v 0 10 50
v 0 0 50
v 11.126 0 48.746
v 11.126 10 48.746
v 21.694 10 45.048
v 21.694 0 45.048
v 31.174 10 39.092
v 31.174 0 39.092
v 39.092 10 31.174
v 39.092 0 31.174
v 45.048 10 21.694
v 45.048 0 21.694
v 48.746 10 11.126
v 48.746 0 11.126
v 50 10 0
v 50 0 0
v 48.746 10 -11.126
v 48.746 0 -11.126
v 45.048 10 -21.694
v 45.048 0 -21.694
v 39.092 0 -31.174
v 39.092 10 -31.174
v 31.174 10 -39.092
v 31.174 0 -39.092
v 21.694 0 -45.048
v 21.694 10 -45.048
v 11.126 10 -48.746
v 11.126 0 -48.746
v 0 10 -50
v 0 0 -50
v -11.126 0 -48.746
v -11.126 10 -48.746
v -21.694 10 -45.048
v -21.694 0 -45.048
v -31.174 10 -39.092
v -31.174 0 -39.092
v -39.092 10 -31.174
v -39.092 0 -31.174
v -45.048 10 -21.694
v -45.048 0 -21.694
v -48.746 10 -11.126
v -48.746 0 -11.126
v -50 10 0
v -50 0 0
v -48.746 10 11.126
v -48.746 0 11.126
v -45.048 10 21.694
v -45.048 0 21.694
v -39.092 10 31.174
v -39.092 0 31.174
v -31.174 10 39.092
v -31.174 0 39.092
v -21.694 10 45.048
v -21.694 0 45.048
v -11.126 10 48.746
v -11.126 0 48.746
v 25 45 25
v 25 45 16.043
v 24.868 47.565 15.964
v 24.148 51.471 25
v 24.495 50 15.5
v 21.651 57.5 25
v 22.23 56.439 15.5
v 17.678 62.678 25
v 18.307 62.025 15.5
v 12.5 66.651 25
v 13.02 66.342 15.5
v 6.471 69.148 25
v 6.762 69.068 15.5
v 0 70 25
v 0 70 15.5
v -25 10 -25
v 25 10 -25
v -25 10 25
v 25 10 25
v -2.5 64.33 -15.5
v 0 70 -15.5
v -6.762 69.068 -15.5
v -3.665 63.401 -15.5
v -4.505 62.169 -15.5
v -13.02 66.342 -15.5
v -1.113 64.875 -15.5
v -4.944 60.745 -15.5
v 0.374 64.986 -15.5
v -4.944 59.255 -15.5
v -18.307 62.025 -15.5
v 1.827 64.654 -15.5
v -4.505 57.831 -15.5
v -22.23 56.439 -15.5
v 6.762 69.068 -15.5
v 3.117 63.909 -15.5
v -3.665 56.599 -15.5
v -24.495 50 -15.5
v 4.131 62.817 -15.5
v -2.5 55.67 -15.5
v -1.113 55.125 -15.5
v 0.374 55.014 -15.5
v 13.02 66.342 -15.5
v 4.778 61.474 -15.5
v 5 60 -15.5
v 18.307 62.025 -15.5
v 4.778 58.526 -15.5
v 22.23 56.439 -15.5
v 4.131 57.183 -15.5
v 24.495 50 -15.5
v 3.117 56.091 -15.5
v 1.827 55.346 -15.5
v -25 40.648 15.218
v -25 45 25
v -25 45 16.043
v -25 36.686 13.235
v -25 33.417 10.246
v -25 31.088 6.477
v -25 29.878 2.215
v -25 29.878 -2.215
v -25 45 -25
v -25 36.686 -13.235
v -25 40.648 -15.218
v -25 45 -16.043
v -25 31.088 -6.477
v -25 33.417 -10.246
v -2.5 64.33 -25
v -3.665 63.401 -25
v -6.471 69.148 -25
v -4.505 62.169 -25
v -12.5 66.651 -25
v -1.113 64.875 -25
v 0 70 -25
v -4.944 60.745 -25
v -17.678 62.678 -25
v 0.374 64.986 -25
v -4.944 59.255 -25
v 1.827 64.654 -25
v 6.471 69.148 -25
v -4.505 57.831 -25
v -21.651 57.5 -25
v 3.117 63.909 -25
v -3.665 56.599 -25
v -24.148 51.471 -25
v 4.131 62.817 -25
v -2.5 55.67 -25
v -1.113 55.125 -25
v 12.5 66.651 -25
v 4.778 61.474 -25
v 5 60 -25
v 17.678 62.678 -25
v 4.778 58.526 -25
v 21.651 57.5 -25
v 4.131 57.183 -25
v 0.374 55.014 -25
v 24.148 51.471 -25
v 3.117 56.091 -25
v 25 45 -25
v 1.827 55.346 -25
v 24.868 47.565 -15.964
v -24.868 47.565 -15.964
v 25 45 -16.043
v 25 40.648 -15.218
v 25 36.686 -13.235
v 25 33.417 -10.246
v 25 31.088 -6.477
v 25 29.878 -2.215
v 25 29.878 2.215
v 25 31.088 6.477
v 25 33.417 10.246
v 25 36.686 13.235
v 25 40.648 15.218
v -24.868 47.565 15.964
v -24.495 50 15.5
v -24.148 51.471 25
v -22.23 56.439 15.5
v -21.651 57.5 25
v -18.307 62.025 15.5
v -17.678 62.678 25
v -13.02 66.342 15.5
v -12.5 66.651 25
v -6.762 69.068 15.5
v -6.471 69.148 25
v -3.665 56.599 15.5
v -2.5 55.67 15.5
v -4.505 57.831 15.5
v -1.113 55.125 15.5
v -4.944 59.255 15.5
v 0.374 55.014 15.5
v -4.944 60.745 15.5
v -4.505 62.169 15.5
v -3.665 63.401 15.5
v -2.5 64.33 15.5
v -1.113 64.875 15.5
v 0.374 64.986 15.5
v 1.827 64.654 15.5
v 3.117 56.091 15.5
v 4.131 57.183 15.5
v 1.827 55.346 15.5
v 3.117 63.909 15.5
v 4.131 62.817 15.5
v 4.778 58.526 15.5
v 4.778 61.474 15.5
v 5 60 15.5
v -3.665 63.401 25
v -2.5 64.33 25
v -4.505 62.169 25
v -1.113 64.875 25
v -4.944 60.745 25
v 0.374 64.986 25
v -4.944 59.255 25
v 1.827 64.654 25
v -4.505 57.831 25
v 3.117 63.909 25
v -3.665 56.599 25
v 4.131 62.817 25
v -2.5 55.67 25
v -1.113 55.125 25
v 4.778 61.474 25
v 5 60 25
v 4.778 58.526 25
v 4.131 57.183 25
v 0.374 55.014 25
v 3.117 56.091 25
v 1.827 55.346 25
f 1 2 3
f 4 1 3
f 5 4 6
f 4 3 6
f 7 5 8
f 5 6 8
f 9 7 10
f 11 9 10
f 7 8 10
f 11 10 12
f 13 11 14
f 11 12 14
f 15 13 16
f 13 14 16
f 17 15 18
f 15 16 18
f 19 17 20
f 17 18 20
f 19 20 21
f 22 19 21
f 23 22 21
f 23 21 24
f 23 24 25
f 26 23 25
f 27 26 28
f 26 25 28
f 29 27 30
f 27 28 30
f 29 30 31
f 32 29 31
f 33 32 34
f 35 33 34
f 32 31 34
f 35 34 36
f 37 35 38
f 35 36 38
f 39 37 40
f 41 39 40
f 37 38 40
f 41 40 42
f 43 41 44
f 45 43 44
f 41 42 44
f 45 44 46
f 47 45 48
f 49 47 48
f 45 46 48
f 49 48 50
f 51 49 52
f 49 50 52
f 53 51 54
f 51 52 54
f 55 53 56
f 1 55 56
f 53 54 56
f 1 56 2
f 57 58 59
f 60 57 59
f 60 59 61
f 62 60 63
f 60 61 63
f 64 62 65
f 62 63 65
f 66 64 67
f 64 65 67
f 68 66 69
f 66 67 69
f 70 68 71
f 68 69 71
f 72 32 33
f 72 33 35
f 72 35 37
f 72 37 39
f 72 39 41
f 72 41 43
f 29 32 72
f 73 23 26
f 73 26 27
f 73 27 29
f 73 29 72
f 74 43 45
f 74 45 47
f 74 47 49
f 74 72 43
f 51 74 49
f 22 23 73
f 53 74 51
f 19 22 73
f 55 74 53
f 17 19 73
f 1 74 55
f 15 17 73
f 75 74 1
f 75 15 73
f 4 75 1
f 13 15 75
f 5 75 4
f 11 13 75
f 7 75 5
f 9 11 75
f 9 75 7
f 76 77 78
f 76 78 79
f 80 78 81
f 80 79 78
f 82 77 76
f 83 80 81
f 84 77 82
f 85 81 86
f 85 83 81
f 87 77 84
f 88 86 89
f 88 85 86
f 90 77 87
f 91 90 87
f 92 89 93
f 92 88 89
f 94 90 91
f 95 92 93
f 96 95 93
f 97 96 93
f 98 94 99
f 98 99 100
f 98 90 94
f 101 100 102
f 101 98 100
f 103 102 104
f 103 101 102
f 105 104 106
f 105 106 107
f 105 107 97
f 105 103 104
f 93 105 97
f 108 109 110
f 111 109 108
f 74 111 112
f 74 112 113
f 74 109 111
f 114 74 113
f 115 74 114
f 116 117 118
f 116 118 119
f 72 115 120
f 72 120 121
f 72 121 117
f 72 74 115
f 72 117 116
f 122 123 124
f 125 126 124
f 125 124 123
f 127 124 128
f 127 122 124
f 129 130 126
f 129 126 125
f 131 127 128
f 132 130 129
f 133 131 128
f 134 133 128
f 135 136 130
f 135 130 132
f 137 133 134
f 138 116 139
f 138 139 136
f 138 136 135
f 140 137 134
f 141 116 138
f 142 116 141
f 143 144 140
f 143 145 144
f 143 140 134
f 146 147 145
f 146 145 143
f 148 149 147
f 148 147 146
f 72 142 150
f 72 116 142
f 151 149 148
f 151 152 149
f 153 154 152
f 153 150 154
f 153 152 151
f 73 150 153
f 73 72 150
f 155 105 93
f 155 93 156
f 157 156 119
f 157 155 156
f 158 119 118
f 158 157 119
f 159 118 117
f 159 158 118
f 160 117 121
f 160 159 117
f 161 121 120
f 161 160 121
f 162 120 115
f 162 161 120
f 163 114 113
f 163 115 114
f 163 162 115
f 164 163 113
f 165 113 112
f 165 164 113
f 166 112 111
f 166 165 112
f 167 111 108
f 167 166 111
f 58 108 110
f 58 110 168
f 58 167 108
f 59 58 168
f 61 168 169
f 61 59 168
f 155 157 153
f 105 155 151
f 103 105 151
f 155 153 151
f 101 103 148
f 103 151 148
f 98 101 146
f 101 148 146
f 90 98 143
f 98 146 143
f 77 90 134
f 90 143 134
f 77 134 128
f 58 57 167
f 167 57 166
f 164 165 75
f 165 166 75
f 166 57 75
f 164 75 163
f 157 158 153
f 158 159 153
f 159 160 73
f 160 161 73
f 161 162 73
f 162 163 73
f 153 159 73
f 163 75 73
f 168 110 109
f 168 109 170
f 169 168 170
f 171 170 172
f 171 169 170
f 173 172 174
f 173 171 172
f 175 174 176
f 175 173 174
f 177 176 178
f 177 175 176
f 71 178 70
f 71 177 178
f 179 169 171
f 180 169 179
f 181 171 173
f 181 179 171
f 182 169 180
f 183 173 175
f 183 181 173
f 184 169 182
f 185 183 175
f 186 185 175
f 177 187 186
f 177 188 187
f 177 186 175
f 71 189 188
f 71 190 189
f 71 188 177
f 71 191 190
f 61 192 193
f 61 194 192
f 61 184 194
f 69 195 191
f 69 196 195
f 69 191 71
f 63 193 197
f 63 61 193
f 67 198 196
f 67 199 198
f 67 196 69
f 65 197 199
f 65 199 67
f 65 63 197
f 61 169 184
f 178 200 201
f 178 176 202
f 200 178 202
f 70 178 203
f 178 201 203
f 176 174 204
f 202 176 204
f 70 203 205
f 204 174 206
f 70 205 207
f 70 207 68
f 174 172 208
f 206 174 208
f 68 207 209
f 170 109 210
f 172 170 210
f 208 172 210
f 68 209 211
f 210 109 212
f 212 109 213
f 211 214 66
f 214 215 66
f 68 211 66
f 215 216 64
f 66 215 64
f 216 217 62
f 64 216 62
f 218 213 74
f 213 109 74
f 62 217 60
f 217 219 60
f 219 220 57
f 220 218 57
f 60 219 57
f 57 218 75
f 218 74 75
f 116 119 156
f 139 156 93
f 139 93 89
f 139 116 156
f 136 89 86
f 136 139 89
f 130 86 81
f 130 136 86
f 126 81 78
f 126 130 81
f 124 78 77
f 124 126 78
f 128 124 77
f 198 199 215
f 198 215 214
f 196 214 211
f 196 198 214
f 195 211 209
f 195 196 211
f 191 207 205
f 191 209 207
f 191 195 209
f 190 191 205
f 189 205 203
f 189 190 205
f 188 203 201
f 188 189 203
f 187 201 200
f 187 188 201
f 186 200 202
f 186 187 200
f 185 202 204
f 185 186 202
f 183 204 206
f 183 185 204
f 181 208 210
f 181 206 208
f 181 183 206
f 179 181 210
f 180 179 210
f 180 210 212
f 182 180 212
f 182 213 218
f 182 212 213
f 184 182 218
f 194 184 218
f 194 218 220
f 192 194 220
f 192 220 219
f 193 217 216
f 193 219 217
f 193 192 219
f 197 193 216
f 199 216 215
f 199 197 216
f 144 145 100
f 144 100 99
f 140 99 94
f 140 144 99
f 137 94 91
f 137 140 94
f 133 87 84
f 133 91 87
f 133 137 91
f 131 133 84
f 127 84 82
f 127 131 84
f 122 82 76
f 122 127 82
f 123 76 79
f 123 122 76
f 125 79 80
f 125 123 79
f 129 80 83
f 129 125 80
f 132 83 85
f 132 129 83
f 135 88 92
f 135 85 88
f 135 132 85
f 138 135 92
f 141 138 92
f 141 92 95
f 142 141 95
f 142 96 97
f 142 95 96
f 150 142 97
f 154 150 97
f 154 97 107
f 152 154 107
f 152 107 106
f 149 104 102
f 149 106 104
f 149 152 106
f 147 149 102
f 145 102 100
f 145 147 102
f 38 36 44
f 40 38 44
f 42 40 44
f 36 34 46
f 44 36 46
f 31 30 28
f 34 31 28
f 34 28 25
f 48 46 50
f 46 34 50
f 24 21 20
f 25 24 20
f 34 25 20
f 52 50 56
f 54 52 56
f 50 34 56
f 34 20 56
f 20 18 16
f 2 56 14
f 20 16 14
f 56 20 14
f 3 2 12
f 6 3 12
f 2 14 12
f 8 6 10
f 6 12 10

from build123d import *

# Parameters (mm, degrees)
SKETCH2_R               = 50
BOSS_EXTRUDE1_DEPTH     = 10
SKETCH3_W               = 50
SKETCH3_H               = 50
BOSS_EXTRUDE2_DEPTH     = 60
CUT_EXTRUDE1_DEPTH      = 115.127122105
CUT_EXTRUDE2_DEPTH      = 109.12145948
CUT_EXTRUDE2_DEPTH_BACK = 109.12145948
SKETCH5_R               = 5
FILLET1_R               = 25


with BuildPart() as part:
    # Sketch2 → Boss-Extrude1 (new body)
    with BuildSketch(Plane(origin=(0, 0, 0), x_dir=(1, 0, 0), z_dir=(0, 1, 0))):
        with Locations(Location((0, 0, 0), (0, 0, 270))):
            Circle(SKETCH2_R)
    extrude(amount=BOSS_EXTRUDE1_DEPTH)

    # Sketch3 → Boss-Extrude2 (add)
    with BuildSketch(Plane(origin=(0, 10, 0), x_dir=(1, 0, 0), z_dir=(0, 1, 0))):
        Rectangle(SKETCH3_W, SKETCH3_H)
    extrude(amount=BOSS_EXTRUDE2_DEPTH)

    # Sketch4 → Cut-Extrude1 (cut, through all)
    with BuildSketch(Plane(origin=(25, 0, 0), x_dir=(0, 0, -1), z_dir=(1, 0, 0))):
        with BuildLine():
            Line((-15.5, 70), (15.5, 70))
            Line((15.5, 70), (15.5, 50))
            ThreePointArc((15.5, 50), (0, 29.724643504), (-15.5, 50))
            Line((-15.5, 50), (-15.5, 70))
        make_face()
    extrude(amount=-CUT_EXTRUDE1_DEPTH, mode=Mode.SUBTRACT)

    # Sketch5 → Cut-Extrude2 (cut, two sides: drawn at the far end of the back side and taken through both)
    with BuildSketch(Plane.XY.offset(-15.5).offset(-CUT_EXTRUDE2_DEPTH_BACK)):
        with Locations((0, 60)):
            Circle(SKETCH5_R)
    extrude(amount=CUT_EXTRUDE2_DEPTH + CUT_EXTRUDE2_DEPTH_BACK, mode=Mode.SUBTRACT)

    # Fillet1
    fillet1_edges = [part.edges().sort_by_distance(p)[0] for p in [
        (25, 70, 20.25),
        (-25, 70, 20.25),
        (-25, 70, -20.25),
        (25, 70, -20.25),
    ]]
    fillet(fillet1_edges, radius=FILLET1_R - 0.0001)  # a hair under: the kernel refuses the full size


solid = part.part
